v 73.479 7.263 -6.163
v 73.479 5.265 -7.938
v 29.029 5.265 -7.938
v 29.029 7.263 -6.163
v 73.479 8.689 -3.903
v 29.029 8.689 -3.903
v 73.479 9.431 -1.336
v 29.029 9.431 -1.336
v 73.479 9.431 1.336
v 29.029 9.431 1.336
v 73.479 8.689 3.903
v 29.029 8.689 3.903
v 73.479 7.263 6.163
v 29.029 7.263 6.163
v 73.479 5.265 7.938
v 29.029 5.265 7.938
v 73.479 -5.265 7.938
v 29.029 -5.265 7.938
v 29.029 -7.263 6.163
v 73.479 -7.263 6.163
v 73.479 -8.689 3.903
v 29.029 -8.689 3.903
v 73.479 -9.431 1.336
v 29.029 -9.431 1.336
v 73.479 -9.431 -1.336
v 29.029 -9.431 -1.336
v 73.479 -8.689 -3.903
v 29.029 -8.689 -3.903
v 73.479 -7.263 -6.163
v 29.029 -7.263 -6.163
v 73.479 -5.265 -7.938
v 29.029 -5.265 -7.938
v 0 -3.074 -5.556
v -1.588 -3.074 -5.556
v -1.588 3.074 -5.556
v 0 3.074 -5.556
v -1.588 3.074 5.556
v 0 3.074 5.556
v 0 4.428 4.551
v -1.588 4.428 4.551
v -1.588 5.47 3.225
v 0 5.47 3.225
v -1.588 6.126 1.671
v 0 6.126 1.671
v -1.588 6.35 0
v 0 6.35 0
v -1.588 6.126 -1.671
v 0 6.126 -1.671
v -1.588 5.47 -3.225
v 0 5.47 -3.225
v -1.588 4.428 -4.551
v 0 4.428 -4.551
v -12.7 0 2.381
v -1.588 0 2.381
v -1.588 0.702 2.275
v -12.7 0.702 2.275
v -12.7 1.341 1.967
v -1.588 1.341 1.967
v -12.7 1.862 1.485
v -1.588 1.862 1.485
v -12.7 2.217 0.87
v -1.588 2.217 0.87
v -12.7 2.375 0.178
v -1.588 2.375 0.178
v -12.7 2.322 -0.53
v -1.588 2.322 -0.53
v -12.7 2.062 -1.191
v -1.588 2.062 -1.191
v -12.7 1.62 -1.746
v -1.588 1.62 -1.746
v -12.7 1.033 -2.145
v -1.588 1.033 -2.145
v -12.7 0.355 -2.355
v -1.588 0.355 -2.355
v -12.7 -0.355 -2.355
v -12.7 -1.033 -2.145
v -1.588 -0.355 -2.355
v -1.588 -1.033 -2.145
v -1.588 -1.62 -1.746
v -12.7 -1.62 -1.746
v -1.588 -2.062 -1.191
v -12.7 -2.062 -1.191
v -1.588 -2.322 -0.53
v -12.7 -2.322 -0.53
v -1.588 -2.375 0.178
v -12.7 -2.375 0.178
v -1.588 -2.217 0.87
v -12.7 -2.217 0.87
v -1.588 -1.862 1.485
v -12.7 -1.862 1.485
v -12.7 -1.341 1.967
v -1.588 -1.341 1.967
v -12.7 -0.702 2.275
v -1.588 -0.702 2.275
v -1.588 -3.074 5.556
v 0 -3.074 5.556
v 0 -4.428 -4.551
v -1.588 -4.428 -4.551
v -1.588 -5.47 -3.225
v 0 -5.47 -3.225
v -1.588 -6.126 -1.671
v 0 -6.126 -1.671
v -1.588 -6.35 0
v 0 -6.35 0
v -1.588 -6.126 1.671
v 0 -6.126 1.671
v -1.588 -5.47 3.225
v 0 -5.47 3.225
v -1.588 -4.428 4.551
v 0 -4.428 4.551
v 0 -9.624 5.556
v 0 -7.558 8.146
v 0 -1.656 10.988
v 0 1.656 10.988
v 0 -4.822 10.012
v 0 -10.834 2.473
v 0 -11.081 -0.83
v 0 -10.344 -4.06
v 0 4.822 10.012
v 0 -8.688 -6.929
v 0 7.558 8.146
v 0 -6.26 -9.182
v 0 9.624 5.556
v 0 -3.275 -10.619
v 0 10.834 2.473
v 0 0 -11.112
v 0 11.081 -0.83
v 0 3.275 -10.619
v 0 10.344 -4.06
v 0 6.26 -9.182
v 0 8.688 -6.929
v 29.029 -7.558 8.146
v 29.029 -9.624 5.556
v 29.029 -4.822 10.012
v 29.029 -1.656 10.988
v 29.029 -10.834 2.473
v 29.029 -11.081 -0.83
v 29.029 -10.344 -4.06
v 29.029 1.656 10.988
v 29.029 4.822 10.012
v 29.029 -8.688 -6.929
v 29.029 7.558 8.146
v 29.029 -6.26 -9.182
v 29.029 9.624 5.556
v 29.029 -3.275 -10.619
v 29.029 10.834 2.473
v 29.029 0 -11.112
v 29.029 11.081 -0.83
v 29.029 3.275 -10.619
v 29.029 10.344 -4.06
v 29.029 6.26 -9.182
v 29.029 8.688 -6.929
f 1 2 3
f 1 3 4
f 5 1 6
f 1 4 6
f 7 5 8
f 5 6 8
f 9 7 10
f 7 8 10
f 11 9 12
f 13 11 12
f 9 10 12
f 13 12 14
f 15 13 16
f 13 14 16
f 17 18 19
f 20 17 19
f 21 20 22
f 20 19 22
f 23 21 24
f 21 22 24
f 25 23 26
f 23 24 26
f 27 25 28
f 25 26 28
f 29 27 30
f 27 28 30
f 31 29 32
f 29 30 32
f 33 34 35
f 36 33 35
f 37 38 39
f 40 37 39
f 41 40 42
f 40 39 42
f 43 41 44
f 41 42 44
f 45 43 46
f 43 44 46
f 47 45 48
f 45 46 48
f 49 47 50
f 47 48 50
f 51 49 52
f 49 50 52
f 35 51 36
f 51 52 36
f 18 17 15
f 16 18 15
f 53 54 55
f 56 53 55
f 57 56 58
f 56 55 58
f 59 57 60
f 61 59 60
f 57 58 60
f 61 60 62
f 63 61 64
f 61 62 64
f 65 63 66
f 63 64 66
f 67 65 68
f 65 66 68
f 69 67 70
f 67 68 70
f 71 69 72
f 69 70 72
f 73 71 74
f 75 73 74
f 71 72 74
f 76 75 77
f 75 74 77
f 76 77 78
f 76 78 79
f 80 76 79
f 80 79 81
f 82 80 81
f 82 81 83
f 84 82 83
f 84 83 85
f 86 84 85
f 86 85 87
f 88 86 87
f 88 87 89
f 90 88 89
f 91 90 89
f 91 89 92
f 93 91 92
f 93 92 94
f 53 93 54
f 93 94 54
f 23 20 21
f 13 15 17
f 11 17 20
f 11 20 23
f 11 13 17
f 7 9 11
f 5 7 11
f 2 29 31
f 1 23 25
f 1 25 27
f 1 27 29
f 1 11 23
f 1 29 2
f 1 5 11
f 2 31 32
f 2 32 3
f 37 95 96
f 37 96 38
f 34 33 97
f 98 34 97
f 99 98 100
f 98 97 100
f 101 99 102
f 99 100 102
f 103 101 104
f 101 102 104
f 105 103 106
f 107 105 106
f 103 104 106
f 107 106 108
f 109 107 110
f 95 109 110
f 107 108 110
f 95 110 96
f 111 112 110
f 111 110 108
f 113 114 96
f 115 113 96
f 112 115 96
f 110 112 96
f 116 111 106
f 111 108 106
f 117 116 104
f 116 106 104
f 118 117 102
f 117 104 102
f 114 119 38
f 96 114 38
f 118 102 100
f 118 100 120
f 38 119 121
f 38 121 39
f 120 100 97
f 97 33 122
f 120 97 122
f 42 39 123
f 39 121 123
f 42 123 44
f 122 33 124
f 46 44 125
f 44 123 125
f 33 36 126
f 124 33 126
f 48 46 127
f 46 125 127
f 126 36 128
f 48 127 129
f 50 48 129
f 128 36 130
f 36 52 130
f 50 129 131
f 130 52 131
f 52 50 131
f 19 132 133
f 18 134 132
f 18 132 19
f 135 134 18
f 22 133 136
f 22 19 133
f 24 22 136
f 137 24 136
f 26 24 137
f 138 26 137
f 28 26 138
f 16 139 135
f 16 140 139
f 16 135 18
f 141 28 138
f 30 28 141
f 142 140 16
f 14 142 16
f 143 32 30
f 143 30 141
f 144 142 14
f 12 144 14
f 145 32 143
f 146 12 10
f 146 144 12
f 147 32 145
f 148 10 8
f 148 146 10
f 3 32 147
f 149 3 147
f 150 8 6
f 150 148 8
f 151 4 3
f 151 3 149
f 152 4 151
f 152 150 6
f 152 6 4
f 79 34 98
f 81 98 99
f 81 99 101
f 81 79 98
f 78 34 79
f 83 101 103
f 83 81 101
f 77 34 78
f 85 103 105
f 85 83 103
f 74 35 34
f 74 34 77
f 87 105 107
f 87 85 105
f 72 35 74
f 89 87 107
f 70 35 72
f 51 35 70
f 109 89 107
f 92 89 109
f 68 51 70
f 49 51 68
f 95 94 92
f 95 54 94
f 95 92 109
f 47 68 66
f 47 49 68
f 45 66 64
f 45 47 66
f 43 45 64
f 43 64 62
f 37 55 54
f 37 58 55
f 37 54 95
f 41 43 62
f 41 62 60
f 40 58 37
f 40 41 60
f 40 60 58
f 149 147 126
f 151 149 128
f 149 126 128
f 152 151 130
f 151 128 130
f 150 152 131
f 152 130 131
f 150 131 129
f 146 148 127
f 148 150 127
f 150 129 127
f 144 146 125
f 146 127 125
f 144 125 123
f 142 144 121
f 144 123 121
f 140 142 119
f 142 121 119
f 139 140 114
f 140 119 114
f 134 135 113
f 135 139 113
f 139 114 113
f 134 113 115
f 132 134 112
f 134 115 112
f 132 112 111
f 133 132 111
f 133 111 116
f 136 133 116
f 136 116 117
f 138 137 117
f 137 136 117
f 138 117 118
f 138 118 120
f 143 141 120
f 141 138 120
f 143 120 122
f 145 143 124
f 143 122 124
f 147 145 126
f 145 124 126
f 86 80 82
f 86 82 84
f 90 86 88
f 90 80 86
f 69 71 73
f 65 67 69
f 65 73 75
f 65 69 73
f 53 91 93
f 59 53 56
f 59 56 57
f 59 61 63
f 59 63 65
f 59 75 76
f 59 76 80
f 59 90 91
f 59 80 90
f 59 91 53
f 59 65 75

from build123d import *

# Parameters (mm, degrees)
SKETCH1_R           = 11.1125
BOSS_EXTRUDE1_DEPTH = 29.028571429
SKETCH2_R           = 9.525
BOSS_EXTRUDE2_DEPTH = 44.45
SKETCH3_W           = 2.553411187
SKETCH3_H           = 10.53028371
SKETCH3_W_2         = 2.754606744
CUT_EXTRUDE1_DEPTH  = 44.45
SKETCH4_R           = 6.35
BOSS_EXTRUDE3_DEPTH = 1.5875
SKETCH5_W           = 1.859243387
SKETCH5_H           = 6.148361062
SKETCH5_W_2         = 2.232892279
CUT_EXTRUDE2_DEPTH  = 1.5875
SKETCH6_R           = 2.38125
BOSS_EXTRUDE4_DEPTH = 11.1125


with BuildPart() as part:
    # Sketch1 → Boss-Extrude1 (new body)
    with BuildSketch(Plane(origin=(0, 0, 0), x_dir=(0, 0, -1), z_dir=(1, 0, 0))):
        Circle(SKETCH1_R)
    extrude(amount=BOSS_EXTRUDE1_DEPTH)

    # Sketch2 → Boss-Extrude2 (add)
    with BuildSketch(Plane(origin=(29.028571429, 0, 0), x_dir=(0, 0, -1), z_dir=(1, 0, 0))):
        Circle(SKETCH2_R)
    extrude(amount=BOSS_EXTRUDE2_DEPTH)

    # Sketch3 → Cut-Extrude1 (cut)
    with BuildSketch(Plane(origin=(73.478571429, 0, 0), x_dir=(0, 0, -1), z_dir=(1, 0, 0))):
        with Locations((-9.214205594, 0)):
            Rectangle(SKETCH3_W, SKETCH3_H)
        with Locations((9.314803372, 0)):
            Rectangle(SKETCH3_W_2, SKETCH3_H)
    extrude(amount=-CUT_EXTRUDE1_DEPTH, mode=Mode.SUBTRACT)

    # Sketch4 → Boss-Extrude3 (add)
    with BuildSketch(Plane.ZY):
        Circle(SKETCH4_R)
    extrude(amount=BOSS_EXTRUDE3_DEPTH)

    # Sketch5 → Cut-Extrude2 (cut)
    with BuildSketch(Plane.ZY.offset(1.5875)):
        with Locations((-6.485871694, 0)):
            Rectangle(SKETCH5_W, SKETCH5_H)
        with Locations((6.67269614, 0)):
            Rectangle(SKETCH5_W_2, SKETCH5_H)
    extrude(amount=-CUT_EXTRUDE2_DEPTH, mode=Mode.SUBTRACT)

    # Sketch6 → Boss-Extrude4 (add)
    with BuildSketch(Plane.ZY.offset(1.5875)):
        Circle(SKETCH6_R)
    extrude(amount=BOSS_EXTRUDE4_DEPTH)


solid = part.part
